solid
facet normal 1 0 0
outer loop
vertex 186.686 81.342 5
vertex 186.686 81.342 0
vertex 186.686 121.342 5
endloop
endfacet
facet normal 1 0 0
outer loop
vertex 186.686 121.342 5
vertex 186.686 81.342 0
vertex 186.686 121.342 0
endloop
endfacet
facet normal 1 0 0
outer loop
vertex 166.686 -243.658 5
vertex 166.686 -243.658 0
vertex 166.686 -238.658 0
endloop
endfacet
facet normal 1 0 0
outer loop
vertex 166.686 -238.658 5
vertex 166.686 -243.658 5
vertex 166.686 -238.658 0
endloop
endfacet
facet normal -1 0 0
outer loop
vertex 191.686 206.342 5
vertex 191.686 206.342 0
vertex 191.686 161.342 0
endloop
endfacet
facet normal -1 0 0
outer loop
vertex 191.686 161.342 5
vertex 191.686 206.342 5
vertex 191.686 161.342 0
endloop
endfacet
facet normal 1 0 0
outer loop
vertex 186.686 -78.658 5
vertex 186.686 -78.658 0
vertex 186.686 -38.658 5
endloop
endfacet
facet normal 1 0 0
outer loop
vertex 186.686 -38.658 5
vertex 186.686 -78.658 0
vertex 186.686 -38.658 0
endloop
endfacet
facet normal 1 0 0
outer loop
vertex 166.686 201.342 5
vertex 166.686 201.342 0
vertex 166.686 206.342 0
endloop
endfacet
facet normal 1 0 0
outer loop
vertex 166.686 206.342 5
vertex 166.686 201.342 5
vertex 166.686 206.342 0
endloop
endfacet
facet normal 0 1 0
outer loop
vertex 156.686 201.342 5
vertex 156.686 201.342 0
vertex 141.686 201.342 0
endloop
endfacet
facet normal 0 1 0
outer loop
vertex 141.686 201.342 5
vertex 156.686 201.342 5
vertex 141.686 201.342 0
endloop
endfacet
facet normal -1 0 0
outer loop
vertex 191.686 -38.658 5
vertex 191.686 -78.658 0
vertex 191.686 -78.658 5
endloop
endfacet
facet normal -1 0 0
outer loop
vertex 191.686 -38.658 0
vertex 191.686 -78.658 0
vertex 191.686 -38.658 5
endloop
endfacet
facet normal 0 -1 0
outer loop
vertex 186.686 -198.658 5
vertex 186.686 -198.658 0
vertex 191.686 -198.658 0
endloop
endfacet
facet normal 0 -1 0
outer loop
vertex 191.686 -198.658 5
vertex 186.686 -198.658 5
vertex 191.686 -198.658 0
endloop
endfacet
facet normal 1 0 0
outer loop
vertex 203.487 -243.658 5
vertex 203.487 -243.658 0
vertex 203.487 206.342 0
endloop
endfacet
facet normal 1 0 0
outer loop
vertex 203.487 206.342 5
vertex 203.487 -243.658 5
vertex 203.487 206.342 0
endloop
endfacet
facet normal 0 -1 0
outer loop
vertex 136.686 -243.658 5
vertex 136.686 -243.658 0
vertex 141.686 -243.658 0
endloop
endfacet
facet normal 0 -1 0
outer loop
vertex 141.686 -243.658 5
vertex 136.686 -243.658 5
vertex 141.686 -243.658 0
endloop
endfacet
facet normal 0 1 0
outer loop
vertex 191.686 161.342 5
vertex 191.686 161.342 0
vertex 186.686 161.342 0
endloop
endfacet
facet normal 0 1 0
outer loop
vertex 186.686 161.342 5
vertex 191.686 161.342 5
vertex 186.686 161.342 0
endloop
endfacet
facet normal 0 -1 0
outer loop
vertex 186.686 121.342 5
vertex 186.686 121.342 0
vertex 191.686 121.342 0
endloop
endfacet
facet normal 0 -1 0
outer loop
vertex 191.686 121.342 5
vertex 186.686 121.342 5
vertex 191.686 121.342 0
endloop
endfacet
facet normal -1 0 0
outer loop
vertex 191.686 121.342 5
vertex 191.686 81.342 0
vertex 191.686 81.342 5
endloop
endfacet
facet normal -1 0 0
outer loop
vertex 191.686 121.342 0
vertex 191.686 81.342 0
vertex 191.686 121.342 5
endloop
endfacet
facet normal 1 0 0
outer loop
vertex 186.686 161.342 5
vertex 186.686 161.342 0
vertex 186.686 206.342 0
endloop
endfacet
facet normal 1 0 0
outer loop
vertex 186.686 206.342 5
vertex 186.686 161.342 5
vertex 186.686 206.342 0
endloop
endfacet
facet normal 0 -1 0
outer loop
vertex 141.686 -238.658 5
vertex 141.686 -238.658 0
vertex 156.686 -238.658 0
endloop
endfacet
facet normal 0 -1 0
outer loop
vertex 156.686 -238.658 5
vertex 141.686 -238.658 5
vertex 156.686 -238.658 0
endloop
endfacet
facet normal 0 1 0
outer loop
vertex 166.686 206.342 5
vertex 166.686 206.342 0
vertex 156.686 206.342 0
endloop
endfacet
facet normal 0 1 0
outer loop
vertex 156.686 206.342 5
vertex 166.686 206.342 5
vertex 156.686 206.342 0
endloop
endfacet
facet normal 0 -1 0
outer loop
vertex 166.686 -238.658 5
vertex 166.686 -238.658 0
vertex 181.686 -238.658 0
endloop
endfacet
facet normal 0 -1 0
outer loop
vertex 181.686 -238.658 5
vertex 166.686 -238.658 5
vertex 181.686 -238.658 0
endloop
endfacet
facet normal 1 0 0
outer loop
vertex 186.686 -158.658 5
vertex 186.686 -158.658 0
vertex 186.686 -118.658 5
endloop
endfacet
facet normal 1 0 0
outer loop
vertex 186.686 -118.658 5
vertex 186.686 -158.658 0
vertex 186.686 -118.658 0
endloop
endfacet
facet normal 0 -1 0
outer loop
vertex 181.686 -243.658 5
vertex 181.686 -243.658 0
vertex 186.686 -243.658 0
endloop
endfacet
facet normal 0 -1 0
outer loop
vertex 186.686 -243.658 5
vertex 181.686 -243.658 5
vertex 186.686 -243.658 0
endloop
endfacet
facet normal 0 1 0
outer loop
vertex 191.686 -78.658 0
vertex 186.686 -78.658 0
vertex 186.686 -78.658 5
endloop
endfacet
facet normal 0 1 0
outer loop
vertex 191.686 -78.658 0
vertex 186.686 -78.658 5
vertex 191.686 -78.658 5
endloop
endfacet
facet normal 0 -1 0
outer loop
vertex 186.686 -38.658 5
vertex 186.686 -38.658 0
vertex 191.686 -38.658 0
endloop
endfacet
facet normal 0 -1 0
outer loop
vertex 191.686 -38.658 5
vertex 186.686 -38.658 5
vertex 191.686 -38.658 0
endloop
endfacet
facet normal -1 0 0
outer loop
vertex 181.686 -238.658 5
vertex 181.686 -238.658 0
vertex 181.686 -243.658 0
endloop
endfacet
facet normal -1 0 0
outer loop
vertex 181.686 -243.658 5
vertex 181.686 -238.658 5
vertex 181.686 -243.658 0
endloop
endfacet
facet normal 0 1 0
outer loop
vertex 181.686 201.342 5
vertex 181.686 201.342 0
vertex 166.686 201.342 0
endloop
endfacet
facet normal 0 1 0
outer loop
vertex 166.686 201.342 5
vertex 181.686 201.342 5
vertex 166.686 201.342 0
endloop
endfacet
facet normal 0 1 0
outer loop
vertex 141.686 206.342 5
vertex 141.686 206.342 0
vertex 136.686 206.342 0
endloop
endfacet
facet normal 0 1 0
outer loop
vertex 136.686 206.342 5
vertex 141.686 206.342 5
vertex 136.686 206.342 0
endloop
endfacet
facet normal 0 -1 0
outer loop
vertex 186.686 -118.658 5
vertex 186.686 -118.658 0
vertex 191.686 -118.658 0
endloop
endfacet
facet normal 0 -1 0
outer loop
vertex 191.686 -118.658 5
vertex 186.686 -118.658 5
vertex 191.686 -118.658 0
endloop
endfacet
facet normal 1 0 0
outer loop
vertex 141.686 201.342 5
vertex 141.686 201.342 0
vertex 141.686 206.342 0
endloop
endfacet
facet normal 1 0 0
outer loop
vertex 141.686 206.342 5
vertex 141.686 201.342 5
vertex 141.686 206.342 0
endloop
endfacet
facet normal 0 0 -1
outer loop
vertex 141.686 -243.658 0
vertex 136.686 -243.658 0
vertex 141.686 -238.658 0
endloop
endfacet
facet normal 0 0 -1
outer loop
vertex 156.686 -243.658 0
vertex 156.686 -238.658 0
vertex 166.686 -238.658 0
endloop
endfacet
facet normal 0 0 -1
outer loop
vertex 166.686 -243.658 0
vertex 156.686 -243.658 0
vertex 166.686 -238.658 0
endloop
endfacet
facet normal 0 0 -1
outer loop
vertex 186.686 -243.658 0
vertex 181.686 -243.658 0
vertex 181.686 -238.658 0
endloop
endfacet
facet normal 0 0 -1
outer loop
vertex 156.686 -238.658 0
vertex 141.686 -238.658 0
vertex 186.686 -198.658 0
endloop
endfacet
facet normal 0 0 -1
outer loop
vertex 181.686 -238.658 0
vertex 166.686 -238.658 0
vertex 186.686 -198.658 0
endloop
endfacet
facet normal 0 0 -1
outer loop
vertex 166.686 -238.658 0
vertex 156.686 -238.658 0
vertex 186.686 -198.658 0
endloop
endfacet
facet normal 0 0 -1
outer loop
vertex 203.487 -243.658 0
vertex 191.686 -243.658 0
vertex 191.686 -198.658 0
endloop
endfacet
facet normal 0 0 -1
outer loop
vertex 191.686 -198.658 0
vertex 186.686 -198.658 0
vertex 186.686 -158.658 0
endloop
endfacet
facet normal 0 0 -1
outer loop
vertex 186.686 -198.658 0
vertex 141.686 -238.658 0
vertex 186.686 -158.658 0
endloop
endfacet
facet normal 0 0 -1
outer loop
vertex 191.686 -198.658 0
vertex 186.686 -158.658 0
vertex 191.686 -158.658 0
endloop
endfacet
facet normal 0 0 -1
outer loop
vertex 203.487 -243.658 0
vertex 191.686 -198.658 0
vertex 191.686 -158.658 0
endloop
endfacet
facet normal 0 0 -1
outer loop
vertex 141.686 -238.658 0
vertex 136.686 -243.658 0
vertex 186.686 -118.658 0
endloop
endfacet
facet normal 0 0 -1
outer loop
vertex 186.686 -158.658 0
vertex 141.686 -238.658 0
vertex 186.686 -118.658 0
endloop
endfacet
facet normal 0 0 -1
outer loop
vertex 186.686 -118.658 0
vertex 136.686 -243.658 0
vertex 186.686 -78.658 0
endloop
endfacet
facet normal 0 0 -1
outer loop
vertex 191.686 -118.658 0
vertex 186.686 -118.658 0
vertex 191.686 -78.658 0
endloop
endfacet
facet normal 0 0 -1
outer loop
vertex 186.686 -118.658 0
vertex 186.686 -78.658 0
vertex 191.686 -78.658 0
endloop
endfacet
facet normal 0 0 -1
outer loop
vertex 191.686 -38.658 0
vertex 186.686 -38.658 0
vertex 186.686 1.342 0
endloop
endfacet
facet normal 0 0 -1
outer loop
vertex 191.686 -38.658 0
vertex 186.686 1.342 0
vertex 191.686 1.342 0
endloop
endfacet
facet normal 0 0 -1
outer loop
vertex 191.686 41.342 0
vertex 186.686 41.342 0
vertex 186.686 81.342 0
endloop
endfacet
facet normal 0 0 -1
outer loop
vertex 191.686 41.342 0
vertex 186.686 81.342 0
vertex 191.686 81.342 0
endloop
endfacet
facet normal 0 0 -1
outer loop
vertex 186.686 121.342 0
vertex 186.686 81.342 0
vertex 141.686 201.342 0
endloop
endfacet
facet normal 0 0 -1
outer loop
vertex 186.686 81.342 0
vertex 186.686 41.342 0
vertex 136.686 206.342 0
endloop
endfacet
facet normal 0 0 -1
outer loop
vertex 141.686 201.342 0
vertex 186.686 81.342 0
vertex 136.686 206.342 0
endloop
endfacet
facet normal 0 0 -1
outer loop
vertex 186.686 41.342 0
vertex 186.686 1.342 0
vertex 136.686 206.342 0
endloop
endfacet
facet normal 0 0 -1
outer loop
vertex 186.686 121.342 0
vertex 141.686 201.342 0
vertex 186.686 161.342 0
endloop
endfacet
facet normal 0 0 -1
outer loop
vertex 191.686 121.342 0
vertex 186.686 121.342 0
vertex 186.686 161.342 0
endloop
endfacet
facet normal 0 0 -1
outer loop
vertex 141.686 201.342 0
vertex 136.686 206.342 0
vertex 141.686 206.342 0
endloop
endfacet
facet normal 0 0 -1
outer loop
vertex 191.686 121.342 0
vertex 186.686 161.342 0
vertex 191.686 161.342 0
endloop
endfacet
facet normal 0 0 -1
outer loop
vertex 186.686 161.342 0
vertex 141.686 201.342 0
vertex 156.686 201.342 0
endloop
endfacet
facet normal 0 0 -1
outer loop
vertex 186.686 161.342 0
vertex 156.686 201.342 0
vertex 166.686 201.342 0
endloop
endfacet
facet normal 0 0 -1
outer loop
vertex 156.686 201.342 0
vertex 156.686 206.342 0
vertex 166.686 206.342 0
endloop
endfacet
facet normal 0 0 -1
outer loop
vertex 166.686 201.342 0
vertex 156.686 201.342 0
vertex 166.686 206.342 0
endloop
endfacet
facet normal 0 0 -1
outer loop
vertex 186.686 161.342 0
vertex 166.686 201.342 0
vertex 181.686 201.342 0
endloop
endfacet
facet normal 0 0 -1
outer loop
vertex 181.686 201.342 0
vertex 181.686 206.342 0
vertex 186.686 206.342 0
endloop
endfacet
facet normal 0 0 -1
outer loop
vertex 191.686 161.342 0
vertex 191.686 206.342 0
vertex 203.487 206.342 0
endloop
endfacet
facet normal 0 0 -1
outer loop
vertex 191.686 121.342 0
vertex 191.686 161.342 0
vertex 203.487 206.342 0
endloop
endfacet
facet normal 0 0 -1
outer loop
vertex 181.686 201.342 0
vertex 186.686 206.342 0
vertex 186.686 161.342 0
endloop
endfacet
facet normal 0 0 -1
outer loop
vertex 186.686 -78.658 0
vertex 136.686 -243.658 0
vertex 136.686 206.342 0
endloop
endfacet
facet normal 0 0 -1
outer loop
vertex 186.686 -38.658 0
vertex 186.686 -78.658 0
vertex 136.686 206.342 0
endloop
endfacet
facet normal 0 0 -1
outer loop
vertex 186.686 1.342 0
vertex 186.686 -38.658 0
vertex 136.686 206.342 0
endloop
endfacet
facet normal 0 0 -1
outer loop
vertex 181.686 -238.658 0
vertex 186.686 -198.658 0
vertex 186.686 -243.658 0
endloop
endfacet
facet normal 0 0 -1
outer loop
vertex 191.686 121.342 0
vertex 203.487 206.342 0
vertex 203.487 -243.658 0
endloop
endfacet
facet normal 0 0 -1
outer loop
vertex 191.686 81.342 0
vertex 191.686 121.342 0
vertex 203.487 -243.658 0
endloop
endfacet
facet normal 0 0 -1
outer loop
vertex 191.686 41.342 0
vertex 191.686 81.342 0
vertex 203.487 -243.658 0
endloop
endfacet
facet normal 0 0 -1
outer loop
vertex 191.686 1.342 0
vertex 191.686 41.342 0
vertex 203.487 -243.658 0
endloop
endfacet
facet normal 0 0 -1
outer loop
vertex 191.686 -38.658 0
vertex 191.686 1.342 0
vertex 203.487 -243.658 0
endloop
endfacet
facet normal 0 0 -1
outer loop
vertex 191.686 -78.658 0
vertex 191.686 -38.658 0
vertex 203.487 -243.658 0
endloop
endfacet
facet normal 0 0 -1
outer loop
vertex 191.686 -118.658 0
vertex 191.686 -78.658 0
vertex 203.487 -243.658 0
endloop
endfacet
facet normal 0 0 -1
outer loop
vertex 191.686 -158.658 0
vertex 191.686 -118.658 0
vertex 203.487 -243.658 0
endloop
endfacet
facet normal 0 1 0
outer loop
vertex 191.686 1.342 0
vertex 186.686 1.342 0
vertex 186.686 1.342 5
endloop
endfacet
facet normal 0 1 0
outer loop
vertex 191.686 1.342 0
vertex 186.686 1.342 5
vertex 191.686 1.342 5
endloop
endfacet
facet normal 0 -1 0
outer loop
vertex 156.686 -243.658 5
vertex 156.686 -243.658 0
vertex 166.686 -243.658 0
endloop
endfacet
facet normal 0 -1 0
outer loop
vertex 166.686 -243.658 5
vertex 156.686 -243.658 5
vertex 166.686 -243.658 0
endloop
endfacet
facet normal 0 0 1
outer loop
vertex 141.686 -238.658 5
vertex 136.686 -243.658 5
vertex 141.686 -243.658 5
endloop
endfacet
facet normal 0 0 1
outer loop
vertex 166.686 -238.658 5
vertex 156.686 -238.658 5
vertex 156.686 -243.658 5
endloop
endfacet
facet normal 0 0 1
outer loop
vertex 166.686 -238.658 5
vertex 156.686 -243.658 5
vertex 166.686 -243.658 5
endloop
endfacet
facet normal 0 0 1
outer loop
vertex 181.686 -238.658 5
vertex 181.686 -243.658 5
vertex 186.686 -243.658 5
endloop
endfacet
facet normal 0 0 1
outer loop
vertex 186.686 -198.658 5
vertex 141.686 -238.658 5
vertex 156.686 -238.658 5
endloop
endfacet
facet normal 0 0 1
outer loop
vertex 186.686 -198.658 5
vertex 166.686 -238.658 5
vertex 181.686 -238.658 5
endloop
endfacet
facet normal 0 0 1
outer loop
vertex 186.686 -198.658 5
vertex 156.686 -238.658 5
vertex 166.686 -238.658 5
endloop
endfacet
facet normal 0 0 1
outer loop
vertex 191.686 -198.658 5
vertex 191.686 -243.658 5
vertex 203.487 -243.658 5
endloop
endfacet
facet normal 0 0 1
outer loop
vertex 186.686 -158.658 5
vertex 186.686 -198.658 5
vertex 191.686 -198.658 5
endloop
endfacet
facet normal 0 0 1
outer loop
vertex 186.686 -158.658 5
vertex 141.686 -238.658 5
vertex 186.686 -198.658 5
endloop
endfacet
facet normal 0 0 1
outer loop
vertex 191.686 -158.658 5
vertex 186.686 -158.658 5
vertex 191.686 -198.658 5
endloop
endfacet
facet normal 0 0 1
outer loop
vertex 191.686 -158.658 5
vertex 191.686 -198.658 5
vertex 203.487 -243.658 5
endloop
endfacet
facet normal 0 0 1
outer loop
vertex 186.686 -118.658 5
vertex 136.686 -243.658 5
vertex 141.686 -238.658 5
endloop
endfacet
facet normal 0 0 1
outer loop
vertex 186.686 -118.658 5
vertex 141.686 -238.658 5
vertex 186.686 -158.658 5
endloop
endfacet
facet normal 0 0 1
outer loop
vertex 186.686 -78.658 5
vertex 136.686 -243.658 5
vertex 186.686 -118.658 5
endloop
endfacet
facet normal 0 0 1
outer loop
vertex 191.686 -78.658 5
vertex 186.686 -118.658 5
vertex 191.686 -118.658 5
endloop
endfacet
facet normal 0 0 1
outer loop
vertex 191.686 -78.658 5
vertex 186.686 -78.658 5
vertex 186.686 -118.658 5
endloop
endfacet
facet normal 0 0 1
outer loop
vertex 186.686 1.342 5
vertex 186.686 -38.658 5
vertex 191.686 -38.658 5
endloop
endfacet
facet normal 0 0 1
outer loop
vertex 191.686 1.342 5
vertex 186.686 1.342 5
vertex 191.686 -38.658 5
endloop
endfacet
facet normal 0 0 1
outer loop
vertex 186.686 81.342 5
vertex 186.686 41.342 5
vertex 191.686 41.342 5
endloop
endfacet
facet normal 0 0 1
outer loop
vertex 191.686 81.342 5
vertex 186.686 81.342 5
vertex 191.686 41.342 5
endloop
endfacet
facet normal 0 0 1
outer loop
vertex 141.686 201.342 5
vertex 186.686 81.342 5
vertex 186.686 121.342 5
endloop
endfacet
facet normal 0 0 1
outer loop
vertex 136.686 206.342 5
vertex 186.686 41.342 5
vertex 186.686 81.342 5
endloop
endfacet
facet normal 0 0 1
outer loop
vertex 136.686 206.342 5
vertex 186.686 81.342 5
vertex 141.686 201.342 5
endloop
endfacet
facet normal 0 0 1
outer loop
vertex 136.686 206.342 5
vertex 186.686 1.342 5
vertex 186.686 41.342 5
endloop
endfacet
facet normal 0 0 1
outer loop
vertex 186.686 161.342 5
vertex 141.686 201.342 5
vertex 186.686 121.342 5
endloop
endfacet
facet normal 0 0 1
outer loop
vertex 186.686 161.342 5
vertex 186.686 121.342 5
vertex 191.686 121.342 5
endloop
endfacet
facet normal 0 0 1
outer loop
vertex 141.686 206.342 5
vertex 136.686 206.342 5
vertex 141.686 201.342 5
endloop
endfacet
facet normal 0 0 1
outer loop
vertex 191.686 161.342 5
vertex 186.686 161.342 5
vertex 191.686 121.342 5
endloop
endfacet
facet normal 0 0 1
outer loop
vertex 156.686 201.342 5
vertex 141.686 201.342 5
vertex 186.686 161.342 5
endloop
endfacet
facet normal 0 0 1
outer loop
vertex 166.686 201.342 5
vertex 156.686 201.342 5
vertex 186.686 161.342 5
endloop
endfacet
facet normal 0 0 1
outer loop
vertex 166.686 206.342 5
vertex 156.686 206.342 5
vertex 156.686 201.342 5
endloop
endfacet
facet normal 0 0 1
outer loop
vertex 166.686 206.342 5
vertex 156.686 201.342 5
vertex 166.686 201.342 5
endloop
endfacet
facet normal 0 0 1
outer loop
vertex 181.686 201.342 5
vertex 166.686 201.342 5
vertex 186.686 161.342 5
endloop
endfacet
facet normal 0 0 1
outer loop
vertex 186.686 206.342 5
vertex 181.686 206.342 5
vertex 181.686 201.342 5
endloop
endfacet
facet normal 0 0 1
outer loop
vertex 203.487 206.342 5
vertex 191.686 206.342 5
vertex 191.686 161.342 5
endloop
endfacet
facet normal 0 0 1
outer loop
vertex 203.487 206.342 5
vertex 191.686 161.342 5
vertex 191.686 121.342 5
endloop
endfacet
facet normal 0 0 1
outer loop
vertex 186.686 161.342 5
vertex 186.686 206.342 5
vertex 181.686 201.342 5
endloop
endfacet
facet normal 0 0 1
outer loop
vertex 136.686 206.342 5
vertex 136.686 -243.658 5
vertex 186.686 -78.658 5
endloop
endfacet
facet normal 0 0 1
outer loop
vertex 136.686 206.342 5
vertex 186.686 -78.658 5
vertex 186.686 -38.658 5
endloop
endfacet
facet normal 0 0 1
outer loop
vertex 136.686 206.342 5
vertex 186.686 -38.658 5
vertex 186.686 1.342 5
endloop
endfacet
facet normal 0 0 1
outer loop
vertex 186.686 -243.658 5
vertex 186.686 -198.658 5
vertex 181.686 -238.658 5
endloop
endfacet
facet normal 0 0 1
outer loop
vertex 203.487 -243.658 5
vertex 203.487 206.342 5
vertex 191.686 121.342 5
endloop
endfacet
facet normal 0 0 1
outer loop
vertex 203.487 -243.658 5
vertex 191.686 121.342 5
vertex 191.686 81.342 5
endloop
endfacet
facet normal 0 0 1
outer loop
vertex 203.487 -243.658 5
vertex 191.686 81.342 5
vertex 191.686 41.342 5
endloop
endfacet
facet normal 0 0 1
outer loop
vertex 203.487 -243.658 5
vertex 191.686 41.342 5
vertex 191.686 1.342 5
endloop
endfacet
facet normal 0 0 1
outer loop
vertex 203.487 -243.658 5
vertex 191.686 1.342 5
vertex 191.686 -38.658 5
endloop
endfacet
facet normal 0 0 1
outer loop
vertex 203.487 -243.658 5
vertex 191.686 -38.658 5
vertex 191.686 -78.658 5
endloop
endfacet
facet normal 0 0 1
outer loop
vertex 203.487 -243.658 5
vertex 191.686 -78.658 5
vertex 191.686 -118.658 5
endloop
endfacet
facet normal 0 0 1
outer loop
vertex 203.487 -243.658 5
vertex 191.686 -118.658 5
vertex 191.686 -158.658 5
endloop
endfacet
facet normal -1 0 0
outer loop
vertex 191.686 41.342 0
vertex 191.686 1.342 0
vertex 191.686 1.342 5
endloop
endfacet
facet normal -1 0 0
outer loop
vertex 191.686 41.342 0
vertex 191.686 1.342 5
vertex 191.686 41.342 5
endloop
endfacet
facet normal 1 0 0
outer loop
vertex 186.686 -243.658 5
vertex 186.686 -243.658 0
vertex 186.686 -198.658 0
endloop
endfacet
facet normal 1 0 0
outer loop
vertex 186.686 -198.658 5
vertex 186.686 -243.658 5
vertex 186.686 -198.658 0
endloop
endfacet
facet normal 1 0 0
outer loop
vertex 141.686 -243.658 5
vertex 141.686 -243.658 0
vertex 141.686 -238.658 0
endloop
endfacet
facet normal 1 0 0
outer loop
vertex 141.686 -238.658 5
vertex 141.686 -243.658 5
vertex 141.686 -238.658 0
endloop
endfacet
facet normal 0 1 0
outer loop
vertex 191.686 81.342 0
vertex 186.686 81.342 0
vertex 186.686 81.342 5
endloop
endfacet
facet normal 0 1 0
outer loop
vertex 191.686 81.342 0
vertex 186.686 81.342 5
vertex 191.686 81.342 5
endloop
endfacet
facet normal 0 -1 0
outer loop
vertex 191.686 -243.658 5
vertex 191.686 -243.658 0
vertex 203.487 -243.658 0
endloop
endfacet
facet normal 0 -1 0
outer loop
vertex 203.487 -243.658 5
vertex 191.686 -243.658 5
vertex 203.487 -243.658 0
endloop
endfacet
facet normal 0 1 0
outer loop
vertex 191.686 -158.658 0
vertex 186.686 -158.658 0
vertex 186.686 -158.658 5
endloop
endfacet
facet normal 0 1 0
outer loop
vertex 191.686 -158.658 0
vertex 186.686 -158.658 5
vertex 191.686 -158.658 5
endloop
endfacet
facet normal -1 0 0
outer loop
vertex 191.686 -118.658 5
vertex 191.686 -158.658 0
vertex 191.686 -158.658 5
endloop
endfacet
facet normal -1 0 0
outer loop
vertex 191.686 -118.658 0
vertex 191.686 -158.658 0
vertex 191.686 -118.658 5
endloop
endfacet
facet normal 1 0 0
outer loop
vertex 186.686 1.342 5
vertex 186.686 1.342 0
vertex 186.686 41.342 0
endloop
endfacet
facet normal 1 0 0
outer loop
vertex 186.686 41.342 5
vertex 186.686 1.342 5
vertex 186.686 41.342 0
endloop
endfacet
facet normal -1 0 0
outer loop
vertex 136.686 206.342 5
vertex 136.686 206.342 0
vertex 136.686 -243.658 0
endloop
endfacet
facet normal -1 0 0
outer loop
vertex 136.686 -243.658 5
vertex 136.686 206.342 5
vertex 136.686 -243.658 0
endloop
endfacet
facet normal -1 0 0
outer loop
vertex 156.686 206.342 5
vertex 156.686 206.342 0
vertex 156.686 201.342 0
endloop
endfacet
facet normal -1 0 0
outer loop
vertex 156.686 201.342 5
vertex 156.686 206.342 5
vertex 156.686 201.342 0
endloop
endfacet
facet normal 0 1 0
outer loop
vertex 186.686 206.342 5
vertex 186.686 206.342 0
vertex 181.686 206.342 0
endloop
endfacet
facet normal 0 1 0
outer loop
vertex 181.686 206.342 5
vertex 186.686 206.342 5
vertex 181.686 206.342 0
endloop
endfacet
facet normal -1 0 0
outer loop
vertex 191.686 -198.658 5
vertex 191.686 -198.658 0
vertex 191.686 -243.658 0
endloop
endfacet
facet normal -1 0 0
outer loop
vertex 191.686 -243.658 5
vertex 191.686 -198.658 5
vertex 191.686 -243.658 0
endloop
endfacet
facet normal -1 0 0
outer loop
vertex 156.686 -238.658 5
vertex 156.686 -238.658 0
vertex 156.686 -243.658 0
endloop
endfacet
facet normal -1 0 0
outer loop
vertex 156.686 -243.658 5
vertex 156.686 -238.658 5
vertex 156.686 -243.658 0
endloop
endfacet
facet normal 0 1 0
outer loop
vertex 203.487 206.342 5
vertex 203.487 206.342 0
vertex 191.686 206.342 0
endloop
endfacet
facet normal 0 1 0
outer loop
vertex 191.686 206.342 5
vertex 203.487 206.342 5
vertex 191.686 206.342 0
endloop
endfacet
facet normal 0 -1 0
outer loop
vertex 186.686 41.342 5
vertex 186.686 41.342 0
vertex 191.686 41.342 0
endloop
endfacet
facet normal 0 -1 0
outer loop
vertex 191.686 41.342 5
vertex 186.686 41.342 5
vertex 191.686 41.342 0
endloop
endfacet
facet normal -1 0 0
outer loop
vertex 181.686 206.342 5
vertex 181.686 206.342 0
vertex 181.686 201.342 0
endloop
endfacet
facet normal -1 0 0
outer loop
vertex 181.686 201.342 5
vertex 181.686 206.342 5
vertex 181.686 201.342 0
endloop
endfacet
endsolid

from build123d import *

# Parameters (mm, degrees)
SKETCH1_W           = 5
SKETCH1_H           = 40
BOSS_EXTRUDE1_DEPTH = 5


with BuildPart() as part:
    # Sketch1 → Boss-Extrude1 (new body)
    with BuildSketch(Plane.XY):
        Polygon((203.486718192, 206.341782002), (191.685694536, 206.341782002), (191.685694536, 161.341782002), (186.685694536, 161.341782002), (186.685694536, 206.341782002), (181.685694536, 206.341782002), (181.685694536, 201.341782002), (166.685694536, 201.341782002), (166.685694536, 206.341782002), (156.685694536, 206.341782002), (156.685694536, 201.341782002), (141.685694536, 201.341782002), (141.685694536, 206.341782002), (136.685694536, 206.341782002), (136.685694536, -243.658217998), (141.685694536, -243.658217998), (141.685694536, -238.658217998), (156.685694536, -238.658217998), (156.685694536, -243.658217998), (166.685694536, -243.658217998), (166.685694536, -238.658217998), (181.685694536, -238.658217998), (181.685694536, -243.658217998), (186.685694536, -243.658217998), (186.685694536, -198.658217998), (191.685694536, -198.658217998), (191.685694536, -243.658217998), (203.486718192, -243.658217998), align=None)
        with Locations((189.185694536, -138.658217998)):
            Rectangle(SKETCH1_W, SKETCH1_H, mode=Mode.SUBTRACT)
        with Locations((189.185694536, -58.658217998)):
            Rectangle(SKETCH1_W, SKETCH1_H, mode=Mode.SUBTRACT)
        with Locations((189.185694536, 21.341782002)):
            Rectangle(SKETCH1_W, SKETCH1_H, mode=Mode.SUBTRACT)
        with Locations((189.185694536, 101.341782002)):
            Rectangle(SKETCH1_W, SKETCH1_H, mode=Mode.SUBTRACT)
    extrude(amount=BOSS_EXTRUDE1_DEPTH)


solid = part.part
